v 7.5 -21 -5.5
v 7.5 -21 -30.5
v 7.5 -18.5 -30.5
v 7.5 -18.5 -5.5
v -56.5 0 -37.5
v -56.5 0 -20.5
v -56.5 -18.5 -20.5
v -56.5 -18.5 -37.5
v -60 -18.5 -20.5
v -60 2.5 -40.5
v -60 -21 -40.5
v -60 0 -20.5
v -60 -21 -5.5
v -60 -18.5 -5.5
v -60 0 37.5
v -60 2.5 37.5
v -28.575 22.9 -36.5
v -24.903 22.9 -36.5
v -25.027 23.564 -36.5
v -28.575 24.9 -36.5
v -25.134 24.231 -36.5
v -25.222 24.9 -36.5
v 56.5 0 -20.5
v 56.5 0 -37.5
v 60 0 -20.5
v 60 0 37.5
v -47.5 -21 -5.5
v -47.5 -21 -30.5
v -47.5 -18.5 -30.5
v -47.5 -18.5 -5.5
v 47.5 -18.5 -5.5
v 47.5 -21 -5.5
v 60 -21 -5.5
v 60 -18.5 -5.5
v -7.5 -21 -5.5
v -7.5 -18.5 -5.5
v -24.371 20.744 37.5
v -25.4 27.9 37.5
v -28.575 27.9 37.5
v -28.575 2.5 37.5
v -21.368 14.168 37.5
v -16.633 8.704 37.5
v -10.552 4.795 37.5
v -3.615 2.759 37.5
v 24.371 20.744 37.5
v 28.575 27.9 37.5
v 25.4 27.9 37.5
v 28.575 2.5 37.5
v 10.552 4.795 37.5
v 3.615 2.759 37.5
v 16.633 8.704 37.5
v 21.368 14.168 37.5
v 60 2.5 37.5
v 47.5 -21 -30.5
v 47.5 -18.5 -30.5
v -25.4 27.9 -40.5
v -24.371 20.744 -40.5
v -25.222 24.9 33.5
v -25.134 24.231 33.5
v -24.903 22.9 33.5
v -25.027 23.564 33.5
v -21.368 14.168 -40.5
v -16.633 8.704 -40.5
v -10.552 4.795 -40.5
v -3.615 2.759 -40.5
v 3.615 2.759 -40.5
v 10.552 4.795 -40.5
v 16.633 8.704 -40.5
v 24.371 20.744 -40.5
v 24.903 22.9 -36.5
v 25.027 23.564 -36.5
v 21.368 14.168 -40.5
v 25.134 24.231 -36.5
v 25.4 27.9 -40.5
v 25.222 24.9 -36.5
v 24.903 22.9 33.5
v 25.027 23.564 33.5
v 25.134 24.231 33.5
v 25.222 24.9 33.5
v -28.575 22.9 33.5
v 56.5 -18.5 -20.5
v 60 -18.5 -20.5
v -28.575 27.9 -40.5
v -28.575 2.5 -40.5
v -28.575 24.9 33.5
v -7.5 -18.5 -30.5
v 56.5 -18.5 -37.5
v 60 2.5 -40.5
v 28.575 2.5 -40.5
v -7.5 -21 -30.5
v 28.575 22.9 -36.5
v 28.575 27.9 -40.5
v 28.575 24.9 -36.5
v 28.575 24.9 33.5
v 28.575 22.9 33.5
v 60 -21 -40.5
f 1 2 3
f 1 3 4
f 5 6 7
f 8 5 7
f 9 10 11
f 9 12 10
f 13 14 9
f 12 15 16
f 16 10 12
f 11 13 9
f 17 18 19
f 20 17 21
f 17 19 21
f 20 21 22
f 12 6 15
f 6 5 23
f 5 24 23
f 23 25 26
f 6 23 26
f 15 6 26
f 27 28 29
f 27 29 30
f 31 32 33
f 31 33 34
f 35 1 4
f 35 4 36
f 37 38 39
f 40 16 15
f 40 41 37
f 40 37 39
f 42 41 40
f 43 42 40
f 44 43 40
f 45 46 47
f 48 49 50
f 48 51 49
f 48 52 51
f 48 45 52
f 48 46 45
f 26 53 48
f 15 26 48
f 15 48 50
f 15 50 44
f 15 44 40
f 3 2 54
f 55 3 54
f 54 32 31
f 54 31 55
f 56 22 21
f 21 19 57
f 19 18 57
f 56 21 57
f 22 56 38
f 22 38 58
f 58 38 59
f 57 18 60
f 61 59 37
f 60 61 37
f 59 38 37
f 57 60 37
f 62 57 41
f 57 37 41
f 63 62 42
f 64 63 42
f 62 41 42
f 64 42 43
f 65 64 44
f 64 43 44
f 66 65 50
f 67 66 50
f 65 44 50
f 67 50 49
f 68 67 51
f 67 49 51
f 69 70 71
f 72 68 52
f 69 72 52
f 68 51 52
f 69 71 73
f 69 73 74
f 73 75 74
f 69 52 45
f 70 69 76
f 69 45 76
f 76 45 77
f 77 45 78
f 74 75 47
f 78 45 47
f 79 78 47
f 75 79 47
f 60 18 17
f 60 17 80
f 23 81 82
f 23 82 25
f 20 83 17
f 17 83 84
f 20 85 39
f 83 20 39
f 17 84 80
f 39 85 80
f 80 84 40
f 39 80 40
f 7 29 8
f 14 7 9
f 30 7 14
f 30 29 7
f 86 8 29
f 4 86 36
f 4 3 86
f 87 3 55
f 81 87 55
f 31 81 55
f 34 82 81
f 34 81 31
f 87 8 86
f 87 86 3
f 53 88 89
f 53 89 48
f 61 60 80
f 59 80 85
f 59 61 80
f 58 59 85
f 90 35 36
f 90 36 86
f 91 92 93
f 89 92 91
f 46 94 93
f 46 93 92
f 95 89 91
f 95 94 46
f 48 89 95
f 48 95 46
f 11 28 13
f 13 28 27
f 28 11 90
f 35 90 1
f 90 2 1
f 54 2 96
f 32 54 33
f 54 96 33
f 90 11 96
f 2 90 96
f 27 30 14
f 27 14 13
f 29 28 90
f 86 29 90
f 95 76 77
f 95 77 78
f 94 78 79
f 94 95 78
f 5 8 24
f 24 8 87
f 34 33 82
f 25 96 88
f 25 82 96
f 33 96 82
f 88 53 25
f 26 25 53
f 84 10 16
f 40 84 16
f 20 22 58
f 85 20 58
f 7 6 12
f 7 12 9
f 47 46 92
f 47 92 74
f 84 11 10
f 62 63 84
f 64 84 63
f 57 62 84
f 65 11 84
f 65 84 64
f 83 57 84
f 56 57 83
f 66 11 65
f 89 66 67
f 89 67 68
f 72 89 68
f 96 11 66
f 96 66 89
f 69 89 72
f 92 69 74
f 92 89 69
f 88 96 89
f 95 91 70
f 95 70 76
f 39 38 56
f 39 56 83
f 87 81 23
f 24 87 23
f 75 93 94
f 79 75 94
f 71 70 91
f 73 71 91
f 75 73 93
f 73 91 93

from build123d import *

# Parameters (mm, degrees)
F0_W      = 115
F0_H      = 75
F1_DEPTH  = 2.5
F2_W      = 115
F2_H      = 23.5
F3_DEPTH  = 3
F4_W      = 40
F4_H      = 10
F5_DEPTH  = 2.5
F6_W      = 23.5
F6_H      = 20
F7_DEPTH  = 2.5
F8_W      = 23.5
F8_H      = 20
F9_DEPTH  = 2.5
F10_W     = 2.5
F10_H     = 15
F10_H_2   = 58
F11_DEPTH = 2.5
F12_W     = 2.5
F12_H     = 15
F12_H_2   = 58
F13_DEPTH = 2.5
F14_W     = 57.15
F14_H     = 78
F15_DEPTH = 25.4
F16_R     = 25.4
F17_DEPTH = 78
F19_DEPTH = 1
F20_DEPTH = 1
F18_W     = 2
F18_H     = 70
F21_DEPTH = 57.15


with BuildPart() as f1:
    # F0 (on Front) → F1 (new body)
    with BuildSketch(Plane.XZ):
        Rectangle(F0_W, F0_H)
    extrude(amount=-F1_DEPTH)

    # F2 (on face) → F3 (join)
    with BuildSketch(Plane(origin=(0, 0, -37.5), x_dir=(1, 0, 0), z_dir=(0, 0, -1))):
        with Locations((0, 9.25)):
            Rectangle(F2_W, F2_H)
    extrude(amount=F3_DEPTH)

    # F4 (on face) → F5 (join)
    with BuildSketch(Plane.XZ.offset(21)):
        Polygon((-57.5, -5.5), (-57.5, -40.5), (-47.5, -40.5), (-47.5, -30.5), (-47.5, -5.5), align=None)
        with Locations((-27.5, -35.5)):
            Rectangle(F4_W, F4_H)
        Polygon((-7.5, -30.5), (-7.5, -40.5), (0, -40.5), (0, -5.5), (-7.5, -5.5), align=None)
        Polygon((0, -5.5), (0, -40.5), (7.5, -40.5), (7.5, -30.5), (7.5, -5.5), align=None)
        with Locations((27.5, -35.5)):
            Rectangle(F4_W, F4_H)
        Polygon((47.5, -30.5), (47.5, -40.5), (57.5, -40.5), (57.5, -5.5), (47.5, -5.5), align=None)
    extrude(amount=-F5_DEPTH)

    # F6 (on face) → F7 (join)
    with BuildSketch(Plane(origin=(-57.5, 0, 0), x_dir=(0, -1, 0), z_dir=(-1, 0, 0))):
        with Locations((9.25, -30.5)):
            Rectangle(F6_W, F6_H)
    extrude(amount=F7_DEPTH)

    # F8 (on face) → F9 (join)
    with BuildSketch(Plane.YZ.offset(57.5)):
        with Locations((-9.25, -30.5)):
            Rectangle(F8_W, F8_H)
    extrude(amount=F9_DEPTH)

    # F10 (on face) → F11 (join)
    with BuildSketch(Plane.YZ.offset(57.5)):
        with Locations((-19.75, -13)):
            Rectangle(F10_W, F10_H)
        with Locations((1.25, 8.5)):
            Rectangle(F10_W, F10_H_2)
    extrude(amount=F11_DEPTH)

    # F12 (on face) → F13 (join)
    with BuildSketch(Plane(origin=(-57.5, 0, 0), x_dir=(0, -1, 0), z_dir=(-1, 0, 0))):
        with Locations((19.75, -13)):
            Rectangle(F12_W, F12_H)
        with Locations((-1.25, 8.5)):
            Rectangle(F12_W, F12_H_2)
    extrude(amount=F13_DEPTH)

    # F14 (on face) → F15 (join)
    with BuildSketch(Plane(origin=(0, 2.5, 0), x_dir=(-1, 0, 0), z_dir=(0, 1, 0))):
        with Locations((0, -1.5)):
            Rectangle(F14_W, F14_H)
    extrude(amount=F15_DEPTH)

    # F16 (on face) → F17 (cut)
    with BuildSketch(Plane.XY.offset(37.5)):
        with Locations((0, 27.9)):
            Circle(F16_R)
    extrude(amount=-F17_DEPTH, mode=Mode.SUBTRACT)

    # F6 (on face) → F19 (join)
    with BuildSketch(Plane(origin=(-57.5, 0, 0), x_dir=(0, -1, 0), z_dir=(-1, 0, 0))):
        with Locations((9.25, -30.5)):
            Rectangle(F6_W, F6_H)
    extrude(amount=-F19_DEPTH)

    # F8 (on face) → F20 (join)
    with BuildSketch(Plane.YZ.offset(57.5)):
        with Locations((-9.25, -30.5)):
            Rectangle(F8_W, F8_H)
    extrude(amount=-F20_DEPTH)

    # F18 (on face) → F21 (cut)
    with BuildSketch(Plane.YZ.offset(28.575)):
        with Locations((23.9, -1.5)):
            Rectangle(F18_W, F18_H)
    extrude(amount=-F21_DEPTH, mode=Mode.SUBTRACT)


solid = f1.part
